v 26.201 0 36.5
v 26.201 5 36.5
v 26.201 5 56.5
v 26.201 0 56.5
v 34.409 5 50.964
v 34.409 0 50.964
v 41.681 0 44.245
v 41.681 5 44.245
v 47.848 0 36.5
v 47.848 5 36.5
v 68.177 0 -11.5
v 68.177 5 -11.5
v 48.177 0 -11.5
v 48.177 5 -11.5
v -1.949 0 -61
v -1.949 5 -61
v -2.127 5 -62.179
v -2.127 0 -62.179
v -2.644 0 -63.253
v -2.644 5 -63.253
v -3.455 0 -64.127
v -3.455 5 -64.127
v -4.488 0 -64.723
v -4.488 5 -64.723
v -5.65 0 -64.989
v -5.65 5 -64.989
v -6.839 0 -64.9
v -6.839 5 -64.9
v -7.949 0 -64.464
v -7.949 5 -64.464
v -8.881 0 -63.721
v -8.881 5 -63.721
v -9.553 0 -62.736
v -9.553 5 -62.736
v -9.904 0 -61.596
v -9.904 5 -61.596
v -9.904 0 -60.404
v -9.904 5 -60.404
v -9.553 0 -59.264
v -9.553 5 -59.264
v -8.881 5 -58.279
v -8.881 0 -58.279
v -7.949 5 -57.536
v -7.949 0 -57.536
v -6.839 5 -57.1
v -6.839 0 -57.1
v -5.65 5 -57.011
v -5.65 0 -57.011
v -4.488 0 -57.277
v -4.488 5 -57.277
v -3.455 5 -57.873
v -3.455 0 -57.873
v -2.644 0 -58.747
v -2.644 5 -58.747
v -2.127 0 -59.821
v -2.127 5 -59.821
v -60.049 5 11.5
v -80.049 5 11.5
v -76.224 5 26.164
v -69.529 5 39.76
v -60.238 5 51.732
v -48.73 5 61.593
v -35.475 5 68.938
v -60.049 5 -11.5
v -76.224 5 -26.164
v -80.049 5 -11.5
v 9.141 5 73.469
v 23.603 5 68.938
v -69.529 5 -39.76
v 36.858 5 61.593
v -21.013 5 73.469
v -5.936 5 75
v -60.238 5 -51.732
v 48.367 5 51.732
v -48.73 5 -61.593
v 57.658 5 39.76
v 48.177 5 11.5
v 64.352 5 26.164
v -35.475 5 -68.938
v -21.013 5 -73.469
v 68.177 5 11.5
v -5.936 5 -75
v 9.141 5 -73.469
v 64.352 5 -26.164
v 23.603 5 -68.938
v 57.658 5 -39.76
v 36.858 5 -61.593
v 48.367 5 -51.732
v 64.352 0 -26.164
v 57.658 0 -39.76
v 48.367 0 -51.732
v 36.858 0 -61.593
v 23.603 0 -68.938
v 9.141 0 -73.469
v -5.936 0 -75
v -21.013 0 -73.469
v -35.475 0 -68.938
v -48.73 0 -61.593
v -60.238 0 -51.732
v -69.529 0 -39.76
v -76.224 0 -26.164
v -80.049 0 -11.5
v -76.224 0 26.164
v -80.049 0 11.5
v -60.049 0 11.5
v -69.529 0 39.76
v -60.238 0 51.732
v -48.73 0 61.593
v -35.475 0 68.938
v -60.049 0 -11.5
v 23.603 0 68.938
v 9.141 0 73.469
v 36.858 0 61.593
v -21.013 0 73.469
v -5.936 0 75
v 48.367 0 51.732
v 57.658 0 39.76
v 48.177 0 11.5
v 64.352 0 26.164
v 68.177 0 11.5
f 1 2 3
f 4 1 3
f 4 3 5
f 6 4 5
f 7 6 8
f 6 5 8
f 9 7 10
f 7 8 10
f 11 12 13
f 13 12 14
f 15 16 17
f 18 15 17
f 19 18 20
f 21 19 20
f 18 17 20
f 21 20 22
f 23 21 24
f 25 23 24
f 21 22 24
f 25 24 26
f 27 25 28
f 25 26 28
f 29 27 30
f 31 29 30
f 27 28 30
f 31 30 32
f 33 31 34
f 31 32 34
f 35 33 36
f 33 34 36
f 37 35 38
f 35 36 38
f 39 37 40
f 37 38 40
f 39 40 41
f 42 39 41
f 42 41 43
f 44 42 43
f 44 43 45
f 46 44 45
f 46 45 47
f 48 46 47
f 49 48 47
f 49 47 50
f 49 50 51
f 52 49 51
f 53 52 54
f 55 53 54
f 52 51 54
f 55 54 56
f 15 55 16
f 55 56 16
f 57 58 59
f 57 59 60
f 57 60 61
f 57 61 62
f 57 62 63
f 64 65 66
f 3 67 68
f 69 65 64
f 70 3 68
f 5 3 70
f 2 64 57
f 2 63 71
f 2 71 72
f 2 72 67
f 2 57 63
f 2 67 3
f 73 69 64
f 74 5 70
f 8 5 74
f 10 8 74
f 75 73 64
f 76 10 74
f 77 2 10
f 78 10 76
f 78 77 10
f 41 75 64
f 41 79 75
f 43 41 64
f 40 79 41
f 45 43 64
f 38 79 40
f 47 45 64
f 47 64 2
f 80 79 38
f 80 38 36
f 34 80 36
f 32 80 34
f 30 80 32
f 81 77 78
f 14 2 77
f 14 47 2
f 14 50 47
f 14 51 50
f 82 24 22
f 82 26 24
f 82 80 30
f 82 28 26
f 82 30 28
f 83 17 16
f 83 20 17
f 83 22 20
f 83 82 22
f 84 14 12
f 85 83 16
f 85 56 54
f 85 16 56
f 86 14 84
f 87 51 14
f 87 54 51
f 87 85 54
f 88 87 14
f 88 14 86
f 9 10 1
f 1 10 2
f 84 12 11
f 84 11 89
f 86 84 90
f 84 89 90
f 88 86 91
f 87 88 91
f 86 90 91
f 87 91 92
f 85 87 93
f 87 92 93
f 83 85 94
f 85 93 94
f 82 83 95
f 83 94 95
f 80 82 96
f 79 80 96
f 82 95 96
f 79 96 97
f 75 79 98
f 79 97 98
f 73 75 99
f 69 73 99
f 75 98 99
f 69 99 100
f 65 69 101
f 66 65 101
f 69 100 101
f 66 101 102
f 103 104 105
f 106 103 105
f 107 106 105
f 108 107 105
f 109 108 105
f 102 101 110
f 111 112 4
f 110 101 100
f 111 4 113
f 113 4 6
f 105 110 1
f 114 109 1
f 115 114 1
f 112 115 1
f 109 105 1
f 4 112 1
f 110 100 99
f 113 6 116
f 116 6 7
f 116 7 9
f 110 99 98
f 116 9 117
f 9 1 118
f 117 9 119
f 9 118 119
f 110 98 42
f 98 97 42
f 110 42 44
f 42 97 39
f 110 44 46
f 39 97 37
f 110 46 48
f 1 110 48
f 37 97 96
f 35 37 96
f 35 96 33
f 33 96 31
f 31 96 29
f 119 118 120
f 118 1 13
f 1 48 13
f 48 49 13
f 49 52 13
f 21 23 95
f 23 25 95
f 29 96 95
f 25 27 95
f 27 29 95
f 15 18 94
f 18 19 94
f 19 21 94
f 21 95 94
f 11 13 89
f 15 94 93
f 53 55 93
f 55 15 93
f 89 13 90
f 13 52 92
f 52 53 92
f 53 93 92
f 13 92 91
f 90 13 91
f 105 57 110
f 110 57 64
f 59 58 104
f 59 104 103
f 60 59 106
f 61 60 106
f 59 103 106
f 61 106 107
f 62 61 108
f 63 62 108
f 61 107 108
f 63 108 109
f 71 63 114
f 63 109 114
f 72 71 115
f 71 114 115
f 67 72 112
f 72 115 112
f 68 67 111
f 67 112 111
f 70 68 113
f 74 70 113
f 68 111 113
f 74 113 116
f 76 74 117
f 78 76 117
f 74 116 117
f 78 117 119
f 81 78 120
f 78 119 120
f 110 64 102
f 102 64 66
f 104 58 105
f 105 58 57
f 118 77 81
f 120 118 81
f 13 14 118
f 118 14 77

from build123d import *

# Parameters (mm, degrees)
SKETCH1_R           = 75
BOSS_EXTRUDE1_DEPTH = 5
SKETCH2_R           = 4
CUT_EXTRUDE1_DEPTH  = 5


with BuildPart() as part:
    # Sketch1 → Boss-Extrude1 (new body)
    with BuildSketch(Plane(origin=(0, 0, 0), x_dir=(1, 0, 0), z_dir=(0, 1, 0))):
        with Locations((-5.935816789, 0)):
            Circle(SKETCH1_R)
    extrude(amount=BOSS_EXTRUDE1_DEPTH)

    # Sketch2 → Cut-Extrude1 (cut)
    with BuildSketch(Plane(origin=(0, 5, 0), x_dir=(1, 0, 0), z_dir=(0, 1, 0))):
        with BuildLine():
            ThreePointArc((-80.048906052, -11.5), (-80.935816789, 0), (-80.048906052, 11.5))
            Line((-80.048906052, 11.5), (-89.004044114, 11.5))
            Line((-89.004044114, 11.5), (-89.004044114, -11.5))
            Line((-89.004044114, -11.5), (-80.048906052, -11.5))
        make_face()
        with BuildLine():
            Line((-69.910421126, 11.5), (-80.048906052, 11.5))
            Line((-80.048906052, 11.5), (-80.048906052, -11.5))
            Line((-80.048906052, -11.5), (-69.910421126, -11.5))
            ThreePointArc((-69.910421126, -11.5), (-70.935816789, 0), (-69.910421126, 11.5))
        make_face()
        with BuildLine():
            Line((-60.048906052, 11.5), (-69.910421126, 11.5))
            ThreePointArc((-69.910421126, 11.5), (-70.935816789, 0), (-69.910421126, -11.5))
            Line((-69.910421126, -11.5), (-60.048906052, -11.5))
            Line((-60.048906052, -11.5), (-60.048906052, 11.5))
        make_face()
        with BuildLine():
            ThreePointArc((59.064183211, 0), (58.807326793, 5.772812059), (58.038787547, 11.5))
            Line((58.038787547, 11.5), (48.177272473, 11.5))
            Line((48.177272473, 11.5), (48.177272473, -11.5))
            Line((48.177272473, -11.5), (58.038787547, -11.5))
            ThreePointArc((58.038787547, -11.5), (58.807326793, -5.772812059), (59.064183211, 0))
        make_face()
        with BuildLine():
            Line((68.177272473, -11.5), (68.177272473, 11.5))
            Line((68.177272473, 11.5), (58.038787547, 11.5))
            ThreePointArc((58.038787547, 11.5), (58.807326793, 5.772812059), (59.064183211, 0))
            ThreePointArc((59.064183211, 0), (58.807326793, -5.772812059), (58.038787547, -11.5))
            Line((58.038787547, -11.5), (68.177272473, -11.5))
        make_face()
        with BuildLine():
            Line((83.116270972, 11.5), (68.177272473, 11.5))
            ThreePointArc((68.177272473, 11.5), (68.842126799, 5.767074879), (69.064183211, 0))
            ThreePointArc((69.064183211, 0), (68.842126799, -5.767074879), (68.177272473, -11.5))
            Line((68.177272473, -11.5), (83.116270972, -11.5))
            Line((83.116270972, -11.5), (83.116270972, 11.5))
        make_face()
        with BuildLine():
            Line((26.200611139, -36.5), (26.200611139, -56.5))
            ThreePointArc((26.200611139, -56.5), (38.173054222, -47.743140849), (47.848474598, -36.5))
            Line((47.848474598, -36.5), (26.200611139, -36.5))
        make_face()
        with Locations((-5.948906052, 60.999998596)):
            Circle(SKETCH2_R)
        with BuildLine():
            Line((-80.048906052, -11.5), (-80.048906052, 11.5))
            ThreePointArc((-80.048906052, 11.5), (-80.935816789, 0), (-80.048906052, -11.5))
        make_face()
        with BuildLine():
            ThreePointArc((69.064183211, 0), (68.842126799, 5.767074879), (68.177272473, 11.5))
            Line((68.177272473, 11.5), (68.177272473, -11.5))
            ThreePointArc((68.177272473, -11.5), (68.842126799, -5.767074879), (69.064183211, 0))
        make_face()
    extrude(amount=-CUT_EXTRUDE1_DEPTH, mode=Mode.SUBTRACT)


solid = part.part
